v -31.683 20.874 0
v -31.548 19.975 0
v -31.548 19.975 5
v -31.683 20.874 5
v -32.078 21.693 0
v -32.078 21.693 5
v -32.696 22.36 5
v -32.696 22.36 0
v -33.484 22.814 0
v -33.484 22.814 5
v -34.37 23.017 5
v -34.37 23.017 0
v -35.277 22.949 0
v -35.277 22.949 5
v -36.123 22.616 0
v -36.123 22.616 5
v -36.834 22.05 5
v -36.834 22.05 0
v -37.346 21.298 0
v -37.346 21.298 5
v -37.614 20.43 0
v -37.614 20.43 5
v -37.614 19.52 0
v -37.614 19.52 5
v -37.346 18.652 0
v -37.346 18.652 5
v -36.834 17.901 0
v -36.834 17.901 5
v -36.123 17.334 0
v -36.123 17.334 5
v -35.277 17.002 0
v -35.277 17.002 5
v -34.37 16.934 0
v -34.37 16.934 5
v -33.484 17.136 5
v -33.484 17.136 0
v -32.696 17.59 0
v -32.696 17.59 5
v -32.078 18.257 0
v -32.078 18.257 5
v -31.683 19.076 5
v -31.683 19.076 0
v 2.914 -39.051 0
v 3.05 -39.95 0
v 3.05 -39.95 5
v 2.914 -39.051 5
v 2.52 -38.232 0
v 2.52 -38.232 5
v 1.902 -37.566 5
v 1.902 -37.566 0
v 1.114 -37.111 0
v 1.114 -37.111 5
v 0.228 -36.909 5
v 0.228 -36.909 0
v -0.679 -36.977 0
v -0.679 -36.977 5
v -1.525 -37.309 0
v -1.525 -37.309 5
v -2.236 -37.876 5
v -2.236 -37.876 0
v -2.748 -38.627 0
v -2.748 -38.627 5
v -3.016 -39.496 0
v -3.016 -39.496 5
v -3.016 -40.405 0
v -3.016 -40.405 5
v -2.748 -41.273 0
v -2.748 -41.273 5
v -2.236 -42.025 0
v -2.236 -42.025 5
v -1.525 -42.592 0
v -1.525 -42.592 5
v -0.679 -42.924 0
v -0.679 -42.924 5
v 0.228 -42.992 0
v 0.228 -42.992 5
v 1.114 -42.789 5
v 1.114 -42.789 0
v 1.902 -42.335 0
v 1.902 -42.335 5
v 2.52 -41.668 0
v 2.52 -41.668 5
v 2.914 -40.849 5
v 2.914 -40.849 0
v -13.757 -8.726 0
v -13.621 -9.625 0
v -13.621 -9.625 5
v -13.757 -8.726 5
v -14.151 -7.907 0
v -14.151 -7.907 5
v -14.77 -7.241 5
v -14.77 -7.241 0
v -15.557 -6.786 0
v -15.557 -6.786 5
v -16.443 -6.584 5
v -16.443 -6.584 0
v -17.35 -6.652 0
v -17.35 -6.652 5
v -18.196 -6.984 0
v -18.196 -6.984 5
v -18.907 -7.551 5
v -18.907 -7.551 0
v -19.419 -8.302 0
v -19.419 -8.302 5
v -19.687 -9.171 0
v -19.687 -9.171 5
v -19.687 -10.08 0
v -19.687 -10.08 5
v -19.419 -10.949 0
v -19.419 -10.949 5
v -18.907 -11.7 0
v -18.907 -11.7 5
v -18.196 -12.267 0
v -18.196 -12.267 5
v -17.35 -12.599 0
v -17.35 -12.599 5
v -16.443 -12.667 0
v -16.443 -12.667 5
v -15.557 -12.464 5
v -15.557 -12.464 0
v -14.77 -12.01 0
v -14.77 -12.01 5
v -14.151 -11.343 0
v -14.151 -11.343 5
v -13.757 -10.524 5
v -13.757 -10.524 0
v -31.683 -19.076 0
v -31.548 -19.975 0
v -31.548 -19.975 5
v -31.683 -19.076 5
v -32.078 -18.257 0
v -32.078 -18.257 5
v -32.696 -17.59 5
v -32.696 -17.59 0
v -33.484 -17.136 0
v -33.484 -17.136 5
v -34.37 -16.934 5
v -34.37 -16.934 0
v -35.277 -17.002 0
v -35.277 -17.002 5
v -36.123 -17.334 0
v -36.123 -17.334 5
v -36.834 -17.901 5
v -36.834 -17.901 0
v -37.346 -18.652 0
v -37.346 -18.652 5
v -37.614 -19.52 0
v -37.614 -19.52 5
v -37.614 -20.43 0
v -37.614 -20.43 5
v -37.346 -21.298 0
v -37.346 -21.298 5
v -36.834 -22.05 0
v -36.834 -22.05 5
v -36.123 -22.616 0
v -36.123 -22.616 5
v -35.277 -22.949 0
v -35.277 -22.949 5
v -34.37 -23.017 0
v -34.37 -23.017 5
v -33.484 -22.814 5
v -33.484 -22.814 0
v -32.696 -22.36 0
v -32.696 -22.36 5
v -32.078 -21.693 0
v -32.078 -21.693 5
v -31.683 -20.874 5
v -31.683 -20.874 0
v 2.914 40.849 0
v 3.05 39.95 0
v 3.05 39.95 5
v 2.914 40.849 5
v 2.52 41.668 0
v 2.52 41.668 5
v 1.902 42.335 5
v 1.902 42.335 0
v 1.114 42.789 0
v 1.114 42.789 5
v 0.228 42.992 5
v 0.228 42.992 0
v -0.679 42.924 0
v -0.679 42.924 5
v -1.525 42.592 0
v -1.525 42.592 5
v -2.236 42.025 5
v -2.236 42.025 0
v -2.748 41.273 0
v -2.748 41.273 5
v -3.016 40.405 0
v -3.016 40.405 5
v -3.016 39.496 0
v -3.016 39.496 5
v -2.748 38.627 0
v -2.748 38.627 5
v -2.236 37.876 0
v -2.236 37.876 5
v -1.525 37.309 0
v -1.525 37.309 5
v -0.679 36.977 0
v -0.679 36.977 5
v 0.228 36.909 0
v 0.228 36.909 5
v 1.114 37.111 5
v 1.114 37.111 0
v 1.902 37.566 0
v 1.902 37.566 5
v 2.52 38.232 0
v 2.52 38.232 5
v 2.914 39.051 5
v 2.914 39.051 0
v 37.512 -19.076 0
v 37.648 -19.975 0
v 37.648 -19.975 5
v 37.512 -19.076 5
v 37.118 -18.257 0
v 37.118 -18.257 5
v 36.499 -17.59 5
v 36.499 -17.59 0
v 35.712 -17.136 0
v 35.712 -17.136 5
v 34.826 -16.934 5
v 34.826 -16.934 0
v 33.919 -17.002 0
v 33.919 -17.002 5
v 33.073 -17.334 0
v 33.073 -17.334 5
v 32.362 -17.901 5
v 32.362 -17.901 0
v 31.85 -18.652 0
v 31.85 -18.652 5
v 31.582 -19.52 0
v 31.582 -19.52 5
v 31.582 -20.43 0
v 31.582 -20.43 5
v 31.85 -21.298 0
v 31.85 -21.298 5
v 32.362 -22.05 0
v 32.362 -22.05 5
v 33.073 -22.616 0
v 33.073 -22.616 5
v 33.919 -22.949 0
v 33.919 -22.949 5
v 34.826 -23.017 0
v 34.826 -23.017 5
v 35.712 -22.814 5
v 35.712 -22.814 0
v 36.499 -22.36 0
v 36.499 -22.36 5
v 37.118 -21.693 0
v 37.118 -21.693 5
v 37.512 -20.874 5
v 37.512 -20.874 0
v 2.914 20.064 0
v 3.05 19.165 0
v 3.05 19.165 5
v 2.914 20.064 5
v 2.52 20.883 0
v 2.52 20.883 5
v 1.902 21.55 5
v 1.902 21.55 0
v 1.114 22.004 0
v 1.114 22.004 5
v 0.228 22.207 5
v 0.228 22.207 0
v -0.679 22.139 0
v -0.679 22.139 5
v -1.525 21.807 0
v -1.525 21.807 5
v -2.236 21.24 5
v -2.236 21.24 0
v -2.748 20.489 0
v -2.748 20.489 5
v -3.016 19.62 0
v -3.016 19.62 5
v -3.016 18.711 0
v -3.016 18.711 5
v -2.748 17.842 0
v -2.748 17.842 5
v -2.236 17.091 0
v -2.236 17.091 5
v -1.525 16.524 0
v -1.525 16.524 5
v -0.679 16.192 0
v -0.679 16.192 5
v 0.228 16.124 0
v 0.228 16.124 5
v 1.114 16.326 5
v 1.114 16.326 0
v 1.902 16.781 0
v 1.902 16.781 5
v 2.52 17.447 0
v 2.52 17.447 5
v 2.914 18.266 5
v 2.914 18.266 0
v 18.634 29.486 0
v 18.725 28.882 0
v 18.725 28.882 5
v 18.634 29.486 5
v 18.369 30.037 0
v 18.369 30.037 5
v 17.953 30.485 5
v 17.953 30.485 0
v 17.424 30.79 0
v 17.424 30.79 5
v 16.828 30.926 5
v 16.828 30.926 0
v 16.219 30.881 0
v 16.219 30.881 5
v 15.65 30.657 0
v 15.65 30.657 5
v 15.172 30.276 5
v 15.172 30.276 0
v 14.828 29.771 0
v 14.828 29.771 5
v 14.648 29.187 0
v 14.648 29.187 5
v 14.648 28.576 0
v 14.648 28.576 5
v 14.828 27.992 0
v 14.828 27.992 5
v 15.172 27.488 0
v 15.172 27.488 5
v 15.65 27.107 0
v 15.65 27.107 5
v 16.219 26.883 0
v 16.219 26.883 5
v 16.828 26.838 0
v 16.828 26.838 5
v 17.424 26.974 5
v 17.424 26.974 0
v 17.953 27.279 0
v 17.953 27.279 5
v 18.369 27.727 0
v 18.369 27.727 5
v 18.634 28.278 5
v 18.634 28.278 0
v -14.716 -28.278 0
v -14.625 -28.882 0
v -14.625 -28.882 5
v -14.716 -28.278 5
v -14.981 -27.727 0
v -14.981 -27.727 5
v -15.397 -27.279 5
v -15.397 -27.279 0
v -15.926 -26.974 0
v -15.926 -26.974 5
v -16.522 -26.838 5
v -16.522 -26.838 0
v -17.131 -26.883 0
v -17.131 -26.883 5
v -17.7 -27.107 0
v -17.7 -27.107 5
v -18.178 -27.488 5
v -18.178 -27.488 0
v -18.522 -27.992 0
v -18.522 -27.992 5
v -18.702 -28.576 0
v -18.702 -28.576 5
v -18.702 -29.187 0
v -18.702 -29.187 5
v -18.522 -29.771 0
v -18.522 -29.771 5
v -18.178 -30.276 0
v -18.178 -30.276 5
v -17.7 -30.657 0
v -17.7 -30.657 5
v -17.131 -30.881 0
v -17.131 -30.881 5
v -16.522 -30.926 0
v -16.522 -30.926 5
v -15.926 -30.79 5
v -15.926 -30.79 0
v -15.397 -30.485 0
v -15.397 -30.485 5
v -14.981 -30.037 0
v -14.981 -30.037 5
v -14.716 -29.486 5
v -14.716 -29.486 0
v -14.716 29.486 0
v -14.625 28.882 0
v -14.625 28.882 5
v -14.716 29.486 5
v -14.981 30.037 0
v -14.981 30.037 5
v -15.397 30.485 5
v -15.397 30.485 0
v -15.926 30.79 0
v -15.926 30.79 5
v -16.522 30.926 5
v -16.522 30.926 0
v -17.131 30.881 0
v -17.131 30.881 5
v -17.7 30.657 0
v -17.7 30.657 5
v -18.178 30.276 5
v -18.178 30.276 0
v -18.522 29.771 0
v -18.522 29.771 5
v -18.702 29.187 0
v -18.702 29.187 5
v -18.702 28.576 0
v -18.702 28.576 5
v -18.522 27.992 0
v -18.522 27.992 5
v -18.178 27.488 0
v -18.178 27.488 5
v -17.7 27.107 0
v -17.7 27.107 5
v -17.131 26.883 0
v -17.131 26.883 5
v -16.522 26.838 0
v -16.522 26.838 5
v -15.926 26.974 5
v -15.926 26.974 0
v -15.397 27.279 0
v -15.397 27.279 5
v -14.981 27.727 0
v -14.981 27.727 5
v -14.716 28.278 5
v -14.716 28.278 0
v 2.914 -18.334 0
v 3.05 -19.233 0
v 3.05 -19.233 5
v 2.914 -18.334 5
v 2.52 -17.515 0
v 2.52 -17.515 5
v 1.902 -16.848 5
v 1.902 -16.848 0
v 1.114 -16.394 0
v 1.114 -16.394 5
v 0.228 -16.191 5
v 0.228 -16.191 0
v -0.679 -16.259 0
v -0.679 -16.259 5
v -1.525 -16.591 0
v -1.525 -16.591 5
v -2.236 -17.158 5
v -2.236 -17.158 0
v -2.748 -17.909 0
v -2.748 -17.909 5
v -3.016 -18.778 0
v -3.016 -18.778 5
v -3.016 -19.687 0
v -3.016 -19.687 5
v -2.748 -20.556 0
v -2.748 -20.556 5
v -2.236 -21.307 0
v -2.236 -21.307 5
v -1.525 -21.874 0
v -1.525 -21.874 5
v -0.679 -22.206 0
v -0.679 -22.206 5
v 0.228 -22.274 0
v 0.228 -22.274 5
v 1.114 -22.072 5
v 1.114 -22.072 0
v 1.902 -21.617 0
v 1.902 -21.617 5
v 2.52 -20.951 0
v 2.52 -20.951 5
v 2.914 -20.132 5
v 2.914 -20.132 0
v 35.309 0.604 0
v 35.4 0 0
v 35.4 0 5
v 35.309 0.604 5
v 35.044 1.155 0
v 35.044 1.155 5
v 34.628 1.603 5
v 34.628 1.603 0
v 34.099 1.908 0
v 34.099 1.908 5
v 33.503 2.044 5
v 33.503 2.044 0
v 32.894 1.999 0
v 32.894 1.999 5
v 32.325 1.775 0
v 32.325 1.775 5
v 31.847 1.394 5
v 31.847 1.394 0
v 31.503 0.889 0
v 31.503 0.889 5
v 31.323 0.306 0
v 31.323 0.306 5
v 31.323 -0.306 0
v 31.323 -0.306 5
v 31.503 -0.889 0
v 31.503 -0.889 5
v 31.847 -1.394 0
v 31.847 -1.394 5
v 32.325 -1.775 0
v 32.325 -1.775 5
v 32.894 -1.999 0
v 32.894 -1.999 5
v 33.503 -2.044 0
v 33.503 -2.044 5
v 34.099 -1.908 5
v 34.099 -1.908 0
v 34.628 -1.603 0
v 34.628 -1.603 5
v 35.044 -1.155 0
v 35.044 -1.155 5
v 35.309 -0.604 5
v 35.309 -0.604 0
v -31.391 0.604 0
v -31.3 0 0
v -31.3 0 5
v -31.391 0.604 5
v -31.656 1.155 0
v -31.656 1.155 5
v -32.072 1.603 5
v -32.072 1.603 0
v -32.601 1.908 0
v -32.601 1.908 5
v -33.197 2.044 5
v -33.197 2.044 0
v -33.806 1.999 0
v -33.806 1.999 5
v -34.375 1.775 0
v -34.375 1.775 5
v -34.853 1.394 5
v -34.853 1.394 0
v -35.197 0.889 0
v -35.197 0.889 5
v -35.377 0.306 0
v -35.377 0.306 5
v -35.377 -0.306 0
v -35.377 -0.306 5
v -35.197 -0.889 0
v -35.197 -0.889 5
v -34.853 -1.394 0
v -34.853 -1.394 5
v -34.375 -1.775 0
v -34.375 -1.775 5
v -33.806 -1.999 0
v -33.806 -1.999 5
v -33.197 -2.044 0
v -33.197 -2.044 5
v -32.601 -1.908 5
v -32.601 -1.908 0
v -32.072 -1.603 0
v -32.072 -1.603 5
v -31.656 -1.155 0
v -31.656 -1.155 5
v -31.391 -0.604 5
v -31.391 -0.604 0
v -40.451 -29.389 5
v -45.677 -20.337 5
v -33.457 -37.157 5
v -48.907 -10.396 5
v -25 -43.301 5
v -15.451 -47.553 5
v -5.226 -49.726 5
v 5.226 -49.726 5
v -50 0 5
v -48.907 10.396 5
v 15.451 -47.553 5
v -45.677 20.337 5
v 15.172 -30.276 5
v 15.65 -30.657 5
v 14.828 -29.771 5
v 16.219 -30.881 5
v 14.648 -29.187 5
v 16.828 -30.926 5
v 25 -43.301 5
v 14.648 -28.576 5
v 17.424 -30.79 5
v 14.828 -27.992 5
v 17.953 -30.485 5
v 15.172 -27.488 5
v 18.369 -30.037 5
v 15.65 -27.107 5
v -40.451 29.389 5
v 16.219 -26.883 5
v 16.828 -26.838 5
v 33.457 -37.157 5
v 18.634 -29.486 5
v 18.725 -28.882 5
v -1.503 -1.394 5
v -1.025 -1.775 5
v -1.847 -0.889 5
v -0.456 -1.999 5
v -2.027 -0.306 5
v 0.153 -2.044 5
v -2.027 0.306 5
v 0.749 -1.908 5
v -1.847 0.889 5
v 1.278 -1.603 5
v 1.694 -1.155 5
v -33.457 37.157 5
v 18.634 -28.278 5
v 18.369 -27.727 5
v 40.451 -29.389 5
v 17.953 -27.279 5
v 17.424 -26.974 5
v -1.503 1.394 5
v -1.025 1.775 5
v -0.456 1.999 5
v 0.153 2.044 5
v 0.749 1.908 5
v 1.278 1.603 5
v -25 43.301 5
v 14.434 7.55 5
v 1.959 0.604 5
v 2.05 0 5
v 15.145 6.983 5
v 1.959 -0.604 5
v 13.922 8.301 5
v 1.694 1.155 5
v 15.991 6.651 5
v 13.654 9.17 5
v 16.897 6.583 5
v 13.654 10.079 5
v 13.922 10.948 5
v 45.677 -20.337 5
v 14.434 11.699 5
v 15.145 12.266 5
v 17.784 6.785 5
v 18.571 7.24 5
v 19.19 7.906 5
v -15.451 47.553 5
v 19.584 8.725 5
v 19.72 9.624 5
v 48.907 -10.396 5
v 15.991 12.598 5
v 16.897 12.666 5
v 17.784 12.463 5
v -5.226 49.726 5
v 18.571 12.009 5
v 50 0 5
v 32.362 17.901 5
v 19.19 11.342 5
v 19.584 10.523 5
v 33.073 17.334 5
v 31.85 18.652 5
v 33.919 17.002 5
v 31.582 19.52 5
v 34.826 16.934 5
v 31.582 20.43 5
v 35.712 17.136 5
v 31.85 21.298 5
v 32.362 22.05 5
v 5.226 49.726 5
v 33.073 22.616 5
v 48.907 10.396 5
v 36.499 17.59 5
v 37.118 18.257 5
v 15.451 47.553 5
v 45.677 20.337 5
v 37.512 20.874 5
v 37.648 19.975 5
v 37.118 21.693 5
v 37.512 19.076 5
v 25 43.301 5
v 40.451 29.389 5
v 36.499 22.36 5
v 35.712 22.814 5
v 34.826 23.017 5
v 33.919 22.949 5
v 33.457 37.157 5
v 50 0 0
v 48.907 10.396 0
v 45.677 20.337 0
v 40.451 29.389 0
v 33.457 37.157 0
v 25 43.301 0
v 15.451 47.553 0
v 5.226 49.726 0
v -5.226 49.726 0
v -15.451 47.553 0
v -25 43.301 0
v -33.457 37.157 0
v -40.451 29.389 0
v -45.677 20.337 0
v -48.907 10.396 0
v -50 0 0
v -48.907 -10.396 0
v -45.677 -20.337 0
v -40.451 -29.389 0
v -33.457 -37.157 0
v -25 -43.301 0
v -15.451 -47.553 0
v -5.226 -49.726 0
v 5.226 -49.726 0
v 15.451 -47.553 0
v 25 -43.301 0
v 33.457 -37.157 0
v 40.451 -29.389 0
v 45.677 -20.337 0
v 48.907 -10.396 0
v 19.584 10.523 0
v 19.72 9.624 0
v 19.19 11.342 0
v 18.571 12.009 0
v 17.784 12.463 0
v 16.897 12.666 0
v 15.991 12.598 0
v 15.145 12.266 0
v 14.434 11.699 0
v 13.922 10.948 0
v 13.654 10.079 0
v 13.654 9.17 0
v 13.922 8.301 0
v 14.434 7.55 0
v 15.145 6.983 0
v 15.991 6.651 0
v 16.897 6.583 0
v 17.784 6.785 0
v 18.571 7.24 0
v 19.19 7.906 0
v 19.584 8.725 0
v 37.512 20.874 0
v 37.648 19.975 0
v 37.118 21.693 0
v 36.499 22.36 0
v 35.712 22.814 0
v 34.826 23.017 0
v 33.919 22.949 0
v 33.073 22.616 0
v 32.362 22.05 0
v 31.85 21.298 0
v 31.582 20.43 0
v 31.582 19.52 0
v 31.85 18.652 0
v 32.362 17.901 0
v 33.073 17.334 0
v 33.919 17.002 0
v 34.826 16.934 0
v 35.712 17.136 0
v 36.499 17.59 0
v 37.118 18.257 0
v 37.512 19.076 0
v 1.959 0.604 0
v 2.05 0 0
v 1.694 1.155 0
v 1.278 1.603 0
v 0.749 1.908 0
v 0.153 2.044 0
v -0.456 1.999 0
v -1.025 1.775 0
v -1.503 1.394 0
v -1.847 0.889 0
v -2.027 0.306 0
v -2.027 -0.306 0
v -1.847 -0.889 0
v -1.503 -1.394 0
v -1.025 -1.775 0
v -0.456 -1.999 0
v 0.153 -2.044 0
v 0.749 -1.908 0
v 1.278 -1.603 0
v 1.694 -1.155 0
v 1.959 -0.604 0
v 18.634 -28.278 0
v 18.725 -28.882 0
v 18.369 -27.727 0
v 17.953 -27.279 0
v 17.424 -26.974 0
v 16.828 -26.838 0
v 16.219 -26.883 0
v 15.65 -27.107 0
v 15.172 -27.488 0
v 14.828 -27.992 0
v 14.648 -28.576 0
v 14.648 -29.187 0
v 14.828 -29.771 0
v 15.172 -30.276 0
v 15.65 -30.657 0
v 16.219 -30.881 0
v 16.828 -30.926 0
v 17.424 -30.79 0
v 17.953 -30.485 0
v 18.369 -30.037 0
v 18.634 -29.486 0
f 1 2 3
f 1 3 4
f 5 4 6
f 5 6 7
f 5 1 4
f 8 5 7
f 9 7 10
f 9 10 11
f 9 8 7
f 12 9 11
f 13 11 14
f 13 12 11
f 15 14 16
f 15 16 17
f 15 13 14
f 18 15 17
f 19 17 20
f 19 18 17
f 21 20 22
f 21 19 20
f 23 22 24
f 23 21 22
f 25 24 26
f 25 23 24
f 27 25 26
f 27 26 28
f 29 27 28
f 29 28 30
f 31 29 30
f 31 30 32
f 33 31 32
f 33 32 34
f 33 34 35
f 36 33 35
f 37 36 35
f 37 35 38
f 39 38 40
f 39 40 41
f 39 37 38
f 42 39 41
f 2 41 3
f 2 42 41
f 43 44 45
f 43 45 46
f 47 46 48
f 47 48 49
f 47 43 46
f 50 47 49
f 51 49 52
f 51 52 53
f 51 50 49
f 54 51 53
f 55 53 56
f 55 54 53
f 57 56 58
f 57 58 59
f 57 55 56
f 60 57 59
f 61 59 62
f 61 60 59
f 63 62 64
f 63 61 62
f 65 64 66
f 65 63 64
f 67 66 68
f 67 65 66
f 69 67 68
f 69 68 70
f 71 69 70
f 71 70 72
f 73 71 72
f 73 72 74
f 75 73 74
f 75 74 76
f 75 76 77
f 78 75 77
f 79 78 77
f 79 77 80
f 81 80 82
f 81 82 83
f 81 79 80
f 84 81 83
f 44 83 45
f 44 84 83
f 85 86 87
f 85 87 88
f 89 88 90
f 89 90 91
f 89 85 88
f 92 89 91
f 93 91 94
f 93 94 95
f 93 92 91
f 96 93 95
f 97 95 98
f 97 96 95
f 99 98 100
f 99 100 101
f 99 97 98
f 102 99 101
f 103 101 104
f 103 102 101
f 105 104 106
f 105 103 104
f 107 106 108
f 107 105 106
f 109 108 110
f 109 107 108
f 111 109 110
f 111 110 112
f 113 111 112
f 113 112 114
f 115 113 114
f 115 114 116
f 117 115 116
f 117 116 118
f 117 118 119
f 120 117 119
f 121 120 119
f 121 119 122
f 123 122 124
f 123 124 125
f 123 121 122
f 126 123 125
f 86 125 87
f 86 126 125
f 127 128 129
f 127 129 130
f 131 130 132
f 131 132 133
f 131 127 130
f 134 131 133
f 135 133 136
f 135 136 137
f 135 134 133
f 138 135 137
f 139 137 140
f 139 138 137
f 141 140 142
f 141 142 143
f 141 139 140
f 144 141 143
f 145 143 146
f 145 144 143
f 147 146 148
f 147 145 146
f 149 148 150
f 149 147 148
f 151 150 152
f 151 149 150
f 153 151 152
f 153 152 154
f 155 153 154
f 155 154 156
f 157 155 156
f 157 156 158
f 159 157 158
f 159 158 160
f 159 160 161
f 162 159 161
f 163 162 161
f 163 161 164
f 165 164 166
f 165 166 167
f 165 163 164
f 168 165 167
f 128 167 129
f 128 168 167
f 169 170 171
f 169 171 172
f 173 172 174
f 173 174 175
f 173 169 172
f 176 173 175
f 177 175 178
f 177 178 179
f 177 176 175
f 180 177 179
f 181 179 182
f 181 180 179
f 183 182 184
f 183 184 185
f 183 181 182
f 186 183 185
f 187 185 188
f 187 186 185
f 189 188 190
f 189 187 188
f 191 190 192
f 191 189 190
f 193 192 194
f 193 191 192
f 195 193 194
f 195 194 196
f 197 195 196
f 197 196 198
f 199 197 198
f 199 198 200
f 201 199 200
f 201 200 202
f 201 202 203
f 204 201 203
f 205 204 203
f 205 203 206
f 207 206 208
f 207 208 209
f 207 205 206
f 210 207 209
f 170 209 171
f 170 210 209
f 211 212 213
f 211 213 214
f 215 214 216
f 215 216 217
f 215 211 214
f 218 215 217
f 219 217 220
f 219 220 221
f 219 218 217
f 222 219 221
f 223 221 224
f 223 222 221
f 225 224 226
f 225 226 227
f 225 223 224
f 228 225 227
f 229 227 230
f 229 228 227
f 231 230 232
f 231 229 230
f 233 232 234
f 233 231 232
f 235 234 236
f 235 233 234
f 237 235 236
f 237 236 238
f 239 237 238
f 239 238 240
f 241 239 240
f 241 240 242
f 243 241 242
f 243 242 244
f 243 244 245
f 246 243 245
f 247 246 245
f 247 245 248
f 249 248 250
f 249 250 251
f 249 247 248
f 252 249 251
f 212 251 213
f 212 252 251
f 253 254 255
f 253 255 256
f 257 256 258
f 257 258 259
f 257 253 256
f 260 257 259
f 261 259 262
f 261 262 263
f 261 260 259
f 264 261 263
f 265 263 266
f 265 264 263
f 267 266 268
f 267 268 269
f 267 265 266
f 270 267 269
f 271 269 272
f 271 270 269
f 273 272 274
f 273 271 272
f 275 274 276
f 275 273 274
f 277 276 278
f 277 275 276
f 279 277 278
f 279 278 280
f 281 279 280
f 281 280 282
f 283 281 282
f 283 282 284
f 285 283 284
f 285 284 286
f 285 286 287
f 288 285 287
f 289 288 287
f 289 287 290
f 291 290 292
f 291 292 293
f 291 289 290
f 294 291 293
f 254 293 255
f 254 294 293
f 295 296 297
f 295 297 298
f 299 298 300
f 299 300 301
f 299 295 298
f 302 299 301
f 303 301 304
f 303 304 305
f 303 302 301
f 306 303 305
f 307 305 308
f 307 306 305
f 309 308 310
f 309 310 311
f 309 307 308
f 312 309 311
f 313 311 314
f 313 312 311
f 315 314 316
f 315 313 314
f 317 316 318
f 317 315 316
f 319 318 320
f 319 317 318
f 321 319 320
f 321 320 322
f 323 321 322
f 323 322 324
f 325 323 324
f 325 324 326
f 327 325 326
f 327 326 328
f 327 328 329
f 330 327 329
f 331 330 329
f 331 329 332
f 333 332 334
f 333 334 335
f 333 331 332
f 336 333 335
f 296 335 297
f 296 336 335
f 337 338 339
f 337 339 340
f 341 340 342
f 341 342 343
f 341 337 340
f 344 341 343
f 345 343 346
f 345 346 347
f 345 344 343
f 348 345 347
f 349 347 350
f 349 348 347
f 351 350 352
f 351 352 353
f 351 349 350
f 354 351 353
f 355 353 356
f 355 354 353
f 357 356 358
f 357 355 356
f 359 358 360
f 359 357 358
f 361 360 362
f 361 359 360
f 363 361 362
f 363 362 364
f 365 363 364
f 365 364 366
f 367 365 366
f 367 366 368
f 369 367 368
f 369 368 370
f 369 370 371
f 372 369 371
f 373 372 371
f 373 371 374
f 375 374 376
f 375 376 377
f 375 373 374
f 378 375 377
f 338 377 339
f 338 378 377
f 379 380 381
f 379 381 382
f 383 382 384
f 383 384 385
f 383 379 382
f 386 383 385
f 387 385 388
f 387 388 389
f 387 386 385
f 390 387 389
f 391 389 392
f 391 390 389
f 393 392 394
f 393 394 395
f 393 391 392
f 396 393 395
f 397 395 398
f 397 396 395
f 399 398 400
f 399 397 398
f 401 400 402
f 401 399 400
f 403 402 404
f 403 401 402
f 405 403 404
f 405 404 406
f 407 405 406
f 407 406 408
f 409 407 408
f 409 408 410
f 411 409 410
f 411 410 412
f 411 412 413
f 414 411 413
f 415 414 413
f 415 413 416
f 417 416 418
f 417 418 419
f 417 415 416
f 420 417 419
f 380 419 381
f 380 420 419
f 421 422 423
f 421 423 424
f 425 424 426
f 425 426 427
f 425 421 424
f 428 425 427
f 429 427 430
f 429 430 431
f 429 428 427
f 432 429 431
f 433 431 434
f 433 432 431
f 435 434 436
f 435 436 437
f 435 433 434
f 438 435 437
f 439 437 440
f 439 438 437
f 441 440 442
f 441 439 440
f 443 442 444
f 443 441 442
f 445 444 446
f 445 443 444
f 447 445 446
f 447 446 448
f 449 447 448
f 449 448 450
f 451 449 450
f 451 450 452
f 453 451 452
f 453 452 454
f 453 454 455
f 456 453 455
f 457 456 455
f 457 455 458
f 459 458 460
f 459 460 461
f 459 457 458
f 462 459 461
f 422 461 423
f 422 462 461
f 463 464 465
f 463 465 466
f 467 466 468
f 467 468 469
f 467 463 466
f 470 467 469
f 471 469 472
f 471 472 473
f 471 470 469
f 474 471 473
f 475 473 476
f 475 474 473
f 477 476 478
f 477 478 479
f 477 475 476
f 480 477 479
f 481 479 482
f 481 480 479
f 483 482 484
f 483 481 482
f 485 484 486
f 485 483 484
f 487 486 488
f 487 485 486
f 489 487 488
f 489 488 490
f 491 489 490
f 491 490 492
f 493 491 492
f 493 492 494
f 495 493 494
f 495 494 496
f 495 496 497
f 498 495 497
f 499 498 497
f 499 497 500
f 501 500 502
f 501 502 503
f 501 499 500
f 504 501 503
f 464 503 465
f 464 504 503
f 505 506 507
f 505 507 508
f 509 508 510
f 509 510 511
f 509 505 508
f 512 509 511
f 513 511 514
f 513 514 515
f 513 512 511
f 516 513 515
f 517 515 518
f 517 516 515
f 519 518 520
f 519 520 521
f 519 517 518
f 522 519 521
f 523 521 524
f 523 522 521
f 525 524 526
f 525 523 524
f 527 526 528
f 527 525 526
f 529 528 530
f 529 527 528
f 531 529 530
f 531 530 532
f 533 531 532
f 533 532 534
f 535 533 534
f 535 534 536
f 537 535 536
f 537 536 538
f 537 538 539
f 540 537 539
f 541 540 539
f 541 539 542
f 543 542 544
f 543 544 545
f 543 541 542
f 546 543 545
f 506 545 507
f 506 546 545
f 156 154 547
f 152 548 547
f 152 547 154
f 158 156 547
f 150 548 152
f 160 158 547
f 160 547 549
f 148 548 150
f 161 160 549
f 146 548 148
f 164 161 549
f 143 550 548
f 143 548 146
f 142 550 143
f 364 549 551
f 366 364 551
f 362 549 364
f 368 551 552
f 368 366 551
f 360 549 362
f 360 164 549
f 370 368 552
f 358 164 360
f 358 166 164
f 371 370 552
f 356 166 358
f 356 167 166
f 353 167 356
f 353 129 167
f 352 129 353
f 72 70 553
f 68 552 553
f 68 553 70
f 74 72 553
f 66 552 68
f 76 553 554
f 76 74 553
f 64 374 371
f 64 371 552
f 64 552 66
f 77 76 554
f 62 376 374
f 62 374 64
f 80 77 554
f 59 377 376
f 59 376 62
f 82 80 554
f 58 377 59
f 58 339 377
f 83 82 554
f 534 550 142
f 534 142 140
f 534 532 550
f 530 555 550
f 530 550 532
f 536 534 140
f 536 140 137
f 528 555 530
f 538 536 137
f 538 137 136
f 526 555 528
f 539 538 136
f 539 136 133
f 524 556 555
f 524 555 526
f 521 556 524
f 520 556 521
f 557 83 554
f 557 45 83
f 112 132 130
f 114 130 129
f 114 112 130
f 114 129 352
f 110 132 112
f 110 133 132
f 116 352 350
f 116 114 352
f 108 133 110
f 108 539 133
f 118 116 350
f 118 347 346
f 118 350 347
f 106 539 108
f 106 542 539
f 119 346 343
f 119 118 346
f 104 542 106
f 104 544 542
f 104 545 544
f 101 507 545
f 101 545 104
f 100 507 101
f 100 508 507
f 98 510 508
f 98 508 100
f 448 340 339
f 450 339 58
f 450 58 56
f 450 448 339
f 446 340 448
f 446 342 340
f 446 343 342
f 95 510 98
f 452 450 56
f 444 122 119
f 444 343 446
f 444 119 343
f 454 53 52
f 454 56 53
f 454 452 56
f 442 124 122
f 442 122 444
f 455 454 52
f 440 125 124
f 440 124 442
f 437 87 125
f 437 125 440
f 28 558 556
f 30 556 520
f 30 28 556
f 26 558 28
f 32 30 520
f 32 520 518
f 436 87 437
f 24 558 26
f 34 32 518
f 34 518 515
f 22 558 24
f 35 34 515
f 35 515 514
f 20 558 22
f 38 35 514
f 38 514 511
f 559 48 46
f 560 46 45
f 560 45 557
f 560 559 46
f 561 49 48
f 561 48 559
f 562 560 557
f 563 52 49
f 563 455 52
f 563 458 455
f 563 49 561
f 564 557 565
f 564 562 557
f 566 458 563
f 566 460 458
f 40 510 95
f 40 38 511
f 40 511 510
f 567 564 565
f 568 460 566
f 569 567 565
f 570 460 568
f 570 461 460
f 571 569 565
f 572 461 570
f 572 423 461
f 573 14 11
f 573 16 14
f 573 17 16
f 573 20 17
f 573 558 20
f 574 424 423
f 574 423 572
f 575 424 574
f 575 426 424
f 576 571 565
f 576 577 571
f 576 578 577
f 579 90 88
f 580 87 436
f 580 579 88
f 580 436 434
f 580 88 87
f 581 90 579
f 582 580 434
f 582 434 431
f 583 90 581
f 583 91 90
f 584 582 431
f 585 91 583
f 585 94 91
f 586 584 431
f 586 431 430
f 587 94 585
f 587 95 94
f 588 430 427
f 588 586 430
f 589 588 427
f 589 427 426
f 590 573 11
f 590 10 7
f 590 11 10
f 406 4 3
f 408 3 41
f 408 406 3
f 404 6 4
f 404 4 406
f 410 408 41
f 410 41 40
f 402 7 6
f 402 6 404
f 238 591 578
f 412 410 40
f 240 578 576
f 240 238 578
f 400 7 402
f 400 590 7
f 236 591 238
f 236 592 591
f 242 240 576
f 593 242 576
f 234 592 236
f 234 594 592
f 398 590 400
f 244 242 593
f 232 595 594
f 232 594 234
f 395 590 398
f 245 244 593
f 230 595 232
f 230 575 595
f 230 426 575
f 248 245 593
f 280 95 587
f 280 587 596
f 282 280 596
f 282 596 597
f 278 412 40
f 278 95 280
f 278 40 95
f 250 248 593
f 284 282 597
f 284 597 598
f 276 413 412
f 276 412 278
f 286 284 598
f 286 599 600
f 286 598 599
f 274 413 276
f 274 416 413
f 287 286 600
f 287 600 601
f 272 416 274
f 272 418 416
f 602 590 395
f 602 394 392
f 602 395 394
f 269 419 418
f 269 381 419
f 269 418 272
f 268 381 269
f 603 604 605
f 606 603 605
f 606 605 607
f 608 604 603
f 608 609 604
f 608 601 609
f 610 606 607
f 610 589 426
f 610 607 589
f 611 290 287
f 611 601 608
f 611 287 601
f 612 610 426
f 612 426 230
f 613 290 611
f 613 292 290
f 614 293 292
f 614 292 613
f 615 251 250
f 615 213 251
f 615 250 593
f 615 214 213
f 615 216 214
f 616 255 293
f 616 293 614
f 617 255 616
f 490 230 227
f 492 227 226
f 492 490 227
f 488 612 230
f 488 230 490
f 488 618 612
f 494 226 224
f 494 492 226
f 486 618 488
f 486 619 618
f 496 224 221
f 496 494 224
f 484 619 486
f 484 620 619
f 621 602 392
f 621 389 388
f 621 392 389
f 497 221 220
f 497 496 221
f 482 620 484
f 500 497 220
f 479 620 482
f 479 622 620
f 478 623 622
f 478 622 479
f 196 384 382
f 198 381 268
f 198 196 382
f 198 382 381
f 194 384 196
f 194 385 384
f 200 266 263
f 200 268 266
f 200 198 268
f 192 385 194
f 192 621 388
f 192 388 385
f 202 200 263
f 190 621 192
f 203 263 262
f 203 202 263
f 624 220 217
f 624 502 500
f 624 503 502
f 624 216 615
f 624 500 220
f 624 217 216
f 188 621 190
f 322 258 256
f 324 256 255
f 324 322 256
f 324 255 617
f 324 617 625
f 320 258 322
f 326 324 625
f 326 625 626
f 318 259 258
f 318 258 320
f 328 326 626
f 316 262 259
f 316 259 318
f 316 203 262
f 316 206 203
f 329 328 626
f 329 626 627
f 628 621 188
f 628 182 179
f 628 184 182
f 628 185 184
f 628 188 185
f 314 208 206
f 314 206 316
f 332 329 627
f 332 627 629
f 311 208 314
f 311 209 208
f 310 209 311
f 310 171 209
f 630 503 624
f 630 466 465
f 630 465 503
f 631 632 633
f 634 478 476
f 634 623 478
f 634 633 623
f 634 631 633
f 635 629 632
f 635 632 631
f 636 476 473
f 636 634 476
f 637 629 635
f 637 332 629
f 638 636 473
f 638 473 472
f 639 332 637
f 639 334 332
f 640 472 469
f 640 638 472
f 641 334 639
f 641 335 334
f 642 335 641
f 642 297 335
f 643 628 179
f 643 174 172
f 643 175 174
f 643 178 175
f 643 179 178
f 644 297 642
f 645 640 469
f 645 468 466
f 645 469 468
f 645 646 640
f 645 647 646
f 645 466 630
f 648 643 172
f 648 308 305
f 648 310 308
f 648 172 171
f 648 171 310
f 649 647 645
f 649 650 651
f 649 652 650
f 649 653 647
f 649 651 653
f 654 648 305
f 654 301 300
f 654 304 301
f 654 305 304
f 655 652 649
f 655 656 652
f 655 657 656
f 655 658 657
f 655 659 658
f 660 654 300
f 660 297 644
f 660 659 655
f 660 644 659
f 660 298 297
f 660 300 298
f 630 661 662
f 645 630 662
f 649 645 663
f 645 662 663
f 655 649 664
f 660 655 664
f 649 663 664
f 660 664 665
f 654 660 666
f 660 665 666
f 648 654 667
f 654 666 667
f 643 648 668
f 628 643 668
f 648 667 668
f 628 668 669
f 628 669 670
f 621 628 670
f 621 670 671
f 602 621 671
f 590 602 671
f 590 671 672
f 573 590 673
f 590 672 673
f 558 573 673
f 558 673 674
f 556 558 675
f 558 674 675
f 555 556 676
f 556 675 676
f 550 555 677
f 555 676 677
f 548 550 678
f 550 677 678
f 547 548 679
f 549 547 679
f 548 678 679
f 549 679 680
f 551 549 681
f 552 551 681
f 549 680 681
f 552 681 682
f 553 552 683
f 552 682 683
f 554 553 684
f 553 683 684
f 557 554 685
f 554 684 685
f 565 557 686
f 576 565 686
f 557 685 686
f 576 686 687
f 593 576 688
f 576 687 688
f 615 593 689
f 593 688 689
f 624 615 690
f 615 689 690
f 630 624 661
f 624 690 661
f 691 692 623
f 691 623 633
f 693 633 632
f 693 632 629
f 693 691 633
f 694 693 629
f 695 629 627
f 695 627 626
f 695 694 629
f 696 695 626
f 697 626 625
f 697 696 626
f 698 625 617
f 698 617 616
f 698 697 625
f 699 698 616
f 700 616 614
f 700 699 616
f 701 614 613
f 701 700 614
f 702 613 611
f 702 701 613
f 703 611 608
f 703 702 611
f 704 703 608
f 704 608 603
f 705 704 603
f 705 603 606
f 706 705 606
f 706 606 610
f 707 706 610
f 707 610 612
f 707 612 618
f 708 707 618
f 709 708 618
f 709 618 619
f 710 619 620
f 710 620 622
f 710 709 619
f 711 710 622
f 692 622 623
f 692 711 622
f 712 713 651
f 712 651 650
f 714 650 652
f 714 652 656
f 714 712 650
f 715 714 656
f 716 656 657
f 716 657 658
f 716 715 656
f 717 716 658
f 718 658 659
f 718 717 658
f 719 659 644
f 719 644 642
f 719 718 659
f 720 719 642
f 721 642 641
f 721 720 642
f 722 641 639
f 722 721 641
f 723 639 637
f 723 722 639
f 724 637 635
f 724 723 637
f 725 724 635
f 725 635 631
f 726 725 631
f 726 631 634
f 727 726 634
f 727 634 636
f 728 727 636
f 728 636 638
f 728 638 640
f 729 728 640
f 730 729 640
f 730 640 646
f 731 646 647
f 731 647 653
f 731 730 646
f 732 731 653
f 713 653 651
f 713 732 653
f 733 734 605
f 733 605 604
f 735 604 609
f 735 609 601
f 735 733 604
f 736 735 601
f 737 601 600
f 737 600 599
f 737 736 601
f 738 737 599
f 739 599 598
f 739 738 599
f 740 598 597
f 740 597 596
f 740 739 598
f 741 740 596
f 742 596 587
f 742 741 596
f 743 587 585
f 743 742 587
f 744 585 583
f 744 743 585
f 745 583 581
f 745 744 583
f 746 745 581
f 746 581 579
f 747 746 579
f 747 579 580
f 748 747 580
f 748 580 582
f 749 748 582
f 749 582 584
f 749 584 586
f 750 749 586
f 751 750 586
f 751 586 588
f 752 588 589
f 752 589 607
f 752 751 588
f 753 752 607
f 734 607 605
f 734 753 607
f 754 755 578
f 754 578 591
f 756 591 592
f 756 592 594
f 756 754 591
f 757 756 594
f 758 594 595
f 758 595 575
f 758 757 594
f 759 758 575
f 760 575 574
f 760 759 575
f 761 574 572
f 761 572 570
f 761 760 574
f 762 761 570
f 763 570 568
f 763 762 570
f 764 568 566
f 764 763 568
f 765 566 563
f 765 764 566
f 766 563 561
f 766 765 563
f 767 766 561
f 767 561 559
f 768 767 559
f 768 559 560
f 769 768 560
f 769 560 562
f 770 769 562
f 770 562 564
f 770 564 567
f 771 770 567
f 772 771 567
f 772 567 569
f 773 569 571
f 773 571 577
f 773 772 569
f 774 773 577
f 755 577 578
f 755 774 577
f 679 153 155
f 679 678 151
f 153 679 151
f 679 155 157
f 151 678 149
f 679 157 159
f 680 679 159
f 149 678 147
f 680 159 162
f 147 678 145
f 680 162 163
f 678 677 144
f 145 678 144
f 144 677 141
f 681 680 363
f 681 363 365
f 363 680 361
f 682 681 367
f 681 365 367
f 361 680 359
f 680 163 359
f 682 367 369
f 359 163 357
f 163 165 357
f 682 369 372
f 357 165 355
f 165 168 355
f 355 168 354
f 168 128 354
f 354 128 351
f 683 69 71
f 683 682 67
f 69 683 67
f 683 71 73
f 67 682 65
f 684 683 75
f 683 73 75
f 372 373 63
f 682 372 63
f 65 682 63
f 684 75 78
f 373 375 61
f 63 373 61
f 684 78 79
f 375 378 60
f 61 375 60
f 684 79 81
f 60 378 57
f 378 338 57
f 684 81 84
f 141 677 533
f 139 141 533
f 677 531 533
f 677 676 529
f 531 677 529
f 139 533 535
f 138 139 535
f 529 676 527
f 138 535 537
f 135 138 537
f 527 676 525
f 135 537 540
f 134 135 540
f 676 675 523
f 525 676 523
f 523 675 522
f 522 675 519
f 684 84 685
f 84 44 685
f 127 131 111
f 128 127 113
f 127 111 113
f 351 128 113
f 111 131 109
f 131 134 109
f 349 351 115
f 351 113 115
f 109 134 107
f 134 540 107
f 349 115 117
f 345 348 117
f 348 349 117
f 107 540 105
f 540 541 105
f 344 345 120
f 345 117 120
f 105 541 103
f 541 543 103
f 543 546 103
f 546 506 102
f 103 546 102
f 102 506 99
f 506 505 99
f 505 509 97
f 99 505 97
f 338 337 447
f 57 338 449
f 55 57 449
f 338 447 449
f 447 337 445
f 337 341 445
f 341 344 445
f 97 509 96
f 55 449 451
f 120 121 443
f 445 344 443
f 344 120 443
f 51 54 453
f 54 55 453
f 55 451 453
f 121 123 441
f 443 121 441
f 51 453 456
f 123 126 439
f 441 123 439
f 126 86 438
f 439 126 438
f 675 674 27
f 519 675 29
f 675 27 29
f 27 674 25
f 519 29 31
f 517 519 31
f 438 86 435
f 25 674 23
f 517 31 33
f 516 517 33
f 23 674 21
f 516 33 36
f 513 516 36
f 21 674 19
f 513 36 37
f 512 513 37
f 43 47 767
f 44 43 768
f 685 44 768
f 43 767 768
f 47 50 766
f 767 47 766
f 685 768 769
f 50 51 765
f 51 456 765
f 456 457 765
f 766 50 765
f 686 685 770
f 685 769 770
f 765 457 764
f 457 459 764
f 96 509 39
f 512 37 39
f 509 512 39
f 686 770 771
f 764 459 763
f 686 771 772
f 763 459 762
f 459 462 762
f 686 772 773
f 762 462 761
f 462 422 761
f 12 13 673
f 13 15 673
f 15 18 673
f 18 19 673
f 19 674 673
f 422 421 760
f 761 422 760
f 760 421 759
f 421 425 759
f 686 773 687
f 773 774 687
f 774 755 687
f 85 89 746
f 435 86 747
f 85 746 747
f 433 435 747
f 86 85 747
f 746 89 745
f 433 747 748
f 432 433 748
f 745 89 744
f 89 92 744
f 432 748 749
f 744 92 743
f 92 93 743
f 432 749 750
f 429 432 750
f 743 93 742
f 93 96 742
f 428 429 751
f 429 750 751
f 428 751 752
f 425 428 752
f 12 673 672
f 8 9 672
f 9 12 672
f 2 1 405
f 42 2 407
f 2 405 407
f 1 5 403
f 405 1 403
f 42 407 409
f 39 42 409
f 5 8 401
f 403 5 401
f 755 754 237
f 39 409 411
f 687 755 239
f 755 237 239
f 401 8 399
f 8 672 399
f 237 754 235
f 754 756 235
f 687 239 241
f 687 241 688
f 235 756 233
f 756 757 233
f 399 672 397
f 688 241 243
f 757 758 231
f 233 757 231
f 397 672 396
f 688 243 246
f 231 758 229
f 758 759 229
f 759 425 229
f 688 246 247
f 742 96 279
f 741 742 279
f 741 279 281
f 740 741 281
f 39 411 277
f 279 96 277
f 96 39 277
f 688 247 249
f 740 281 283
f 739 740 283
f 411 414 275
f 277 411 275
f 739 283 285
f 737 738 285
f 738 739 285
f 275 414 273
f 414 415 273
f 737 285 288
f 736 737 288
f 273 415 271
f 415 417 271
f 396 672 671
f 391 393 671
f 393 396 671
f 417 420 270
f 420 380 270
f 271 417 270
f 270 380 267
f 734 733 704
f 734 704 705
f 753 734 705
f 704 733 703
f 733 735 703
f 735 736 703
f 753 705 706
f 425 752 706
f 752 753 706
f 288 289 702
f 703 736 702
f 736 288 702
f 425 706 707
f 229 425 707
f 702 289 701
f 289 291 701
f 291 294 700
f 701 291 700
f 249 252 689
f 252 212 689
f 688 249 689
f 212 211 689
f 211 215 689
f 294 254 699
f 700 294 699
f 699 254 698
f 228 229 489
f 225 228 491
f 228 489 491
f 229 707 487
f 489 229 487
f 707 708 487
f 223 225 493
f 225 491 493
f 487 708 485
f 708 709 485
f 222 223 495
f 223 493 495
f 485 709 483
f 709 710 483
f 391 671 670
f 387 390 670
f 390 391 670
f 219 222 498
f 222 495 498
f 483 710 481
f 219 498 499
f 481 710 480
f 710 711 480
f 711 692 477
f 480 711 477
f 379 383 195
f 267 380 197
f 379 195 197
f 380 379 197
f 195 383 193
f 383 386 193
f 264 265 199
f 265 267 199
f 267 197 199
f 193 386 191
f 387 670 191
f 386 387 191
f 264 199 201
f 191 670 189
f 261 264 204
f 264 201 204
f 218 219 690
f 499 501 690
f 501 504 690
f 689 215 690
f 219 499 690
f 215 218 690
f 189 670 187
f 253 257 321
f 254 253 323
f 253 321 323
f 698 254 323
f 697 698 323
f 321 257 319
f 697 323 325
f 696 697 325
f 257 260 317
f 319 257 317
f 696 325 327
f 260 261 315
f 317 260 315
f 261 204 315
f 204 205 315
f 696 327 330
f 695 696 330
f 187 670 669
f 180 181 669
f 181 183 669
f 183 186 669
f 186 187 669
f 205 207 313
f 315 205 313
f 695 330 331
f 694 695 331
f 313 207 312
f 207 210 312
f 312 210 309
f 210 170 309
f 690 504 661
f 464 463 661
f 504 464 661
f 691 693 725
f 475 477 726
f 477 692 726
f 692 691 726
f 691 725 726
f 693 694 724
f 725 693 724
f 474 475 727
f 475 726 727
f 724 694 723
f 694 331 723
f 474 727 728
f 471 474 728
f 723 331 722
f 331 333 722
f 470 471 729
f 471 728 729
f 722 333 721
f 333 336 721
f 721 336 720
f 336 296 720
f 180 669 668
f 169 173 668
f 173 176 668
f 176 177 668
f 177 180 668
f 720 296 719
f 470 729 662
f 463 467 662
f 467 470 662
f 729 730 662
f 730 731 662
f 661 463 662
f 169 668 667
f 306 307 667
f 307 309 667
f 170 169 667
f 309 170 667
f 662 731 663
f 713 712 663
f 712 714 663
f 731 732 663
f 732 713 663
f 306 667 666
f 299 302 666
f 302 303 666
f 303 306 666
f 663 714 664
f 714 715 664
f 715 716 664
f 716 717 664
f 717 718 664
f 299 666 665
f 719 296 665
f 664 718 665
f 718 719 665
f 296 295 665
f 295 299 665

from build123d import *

# Parameters (mm, degrees)
ESQUISSE1_R        = 50
ESQUISSE1_R_2      = 3.05
ESQUISSE1_R_3      = 2.05
BOSS_EXTRU_1_DEPTH = 5


with BuildPart() as part:
    # Esquisse1 → Boss.-Extru.1 (new body)
    with BuildSketch(Plane.XY):
        Circle(ESQUISSE1_R)
        with Locations((-34.597845014, 19.975075133)):
            Circle(ESQUISSE1_R_2, mode=Mode.SUBTRACT)
        with Locations((0, 39.950150265)):
            Circle(ESQUISSE1_R_2, mode=Mode.SUBTRACT)
        with Locations((34.597845014, 19.975075133)):
            Circle(ESQUISSE1_R_2, mode=Mode.SUBTRACT)
        with Locations((34.597845014, -19.975075132)):
            Circle(ESQUISSE1_R_2, mode=Mode.SUBTRACT)
        with Locations((0, -39.950150265)):
            Circle(ESQUISSE1_R_2, mode=Mode.SUBTRACT)
        with Locations((-34.597845014, -19.975075133)):
            Circle(ESQUISSE1_R_2, mode=Mode.SUBTRACT)
        with Locations((0, 19.165334425)):
            Circle(ESQUISSE1_R_2, mode=Mode.SUBTRACT)
        with Locations((0, -19.232757636)):
            Circle(ESQUISSE1_R_2, mode=Mode.SUBTRACT)
        with Locations((-33.35, 0)):
            Circle(ESQUISSE1_R_3, mode=Mode.SUBTRACT)
        with Locations((-16.675, 28.881947216)):
            Circle(ESQUISSE1_R_3, mode=Mode.SUBTRACT)
        with Locations((16.675, 28.881947216)):
            Circle(ESQUISSE1_R_3, mode=Mode.SUBTRACT)
        with Locations((33.35, 0)):
            Circle(ESQUISSE1_R_3, mode=Mode.SUBTRACT)
        with Locations((16.675, -28.881947216)):
            Circle(ESQUISSE1_R_3, mode=Mode.SUBTRACT)
        with Locations((-16.675, -28.881947216)):
            Circle(ESQUISSE1_R_3, mode=Mode.SUBTRACT)
        Circle(ESQUISSE1_R_3, mode=Mode.SUBTRACT)
        with Locations((-16.671397033, -9.625235564)):
            Circle(ESQUISSE1_R_2, mode=Mode.SUBTRACT)
        with Locations((16.669571796, 9.624181764)):
            Circle(ESQUISSE1_R_2, mode=Mode.SUBTRACT)
    extrude(amount=BOSS_EXTRU_1_DEPTH)


solid = part.part
